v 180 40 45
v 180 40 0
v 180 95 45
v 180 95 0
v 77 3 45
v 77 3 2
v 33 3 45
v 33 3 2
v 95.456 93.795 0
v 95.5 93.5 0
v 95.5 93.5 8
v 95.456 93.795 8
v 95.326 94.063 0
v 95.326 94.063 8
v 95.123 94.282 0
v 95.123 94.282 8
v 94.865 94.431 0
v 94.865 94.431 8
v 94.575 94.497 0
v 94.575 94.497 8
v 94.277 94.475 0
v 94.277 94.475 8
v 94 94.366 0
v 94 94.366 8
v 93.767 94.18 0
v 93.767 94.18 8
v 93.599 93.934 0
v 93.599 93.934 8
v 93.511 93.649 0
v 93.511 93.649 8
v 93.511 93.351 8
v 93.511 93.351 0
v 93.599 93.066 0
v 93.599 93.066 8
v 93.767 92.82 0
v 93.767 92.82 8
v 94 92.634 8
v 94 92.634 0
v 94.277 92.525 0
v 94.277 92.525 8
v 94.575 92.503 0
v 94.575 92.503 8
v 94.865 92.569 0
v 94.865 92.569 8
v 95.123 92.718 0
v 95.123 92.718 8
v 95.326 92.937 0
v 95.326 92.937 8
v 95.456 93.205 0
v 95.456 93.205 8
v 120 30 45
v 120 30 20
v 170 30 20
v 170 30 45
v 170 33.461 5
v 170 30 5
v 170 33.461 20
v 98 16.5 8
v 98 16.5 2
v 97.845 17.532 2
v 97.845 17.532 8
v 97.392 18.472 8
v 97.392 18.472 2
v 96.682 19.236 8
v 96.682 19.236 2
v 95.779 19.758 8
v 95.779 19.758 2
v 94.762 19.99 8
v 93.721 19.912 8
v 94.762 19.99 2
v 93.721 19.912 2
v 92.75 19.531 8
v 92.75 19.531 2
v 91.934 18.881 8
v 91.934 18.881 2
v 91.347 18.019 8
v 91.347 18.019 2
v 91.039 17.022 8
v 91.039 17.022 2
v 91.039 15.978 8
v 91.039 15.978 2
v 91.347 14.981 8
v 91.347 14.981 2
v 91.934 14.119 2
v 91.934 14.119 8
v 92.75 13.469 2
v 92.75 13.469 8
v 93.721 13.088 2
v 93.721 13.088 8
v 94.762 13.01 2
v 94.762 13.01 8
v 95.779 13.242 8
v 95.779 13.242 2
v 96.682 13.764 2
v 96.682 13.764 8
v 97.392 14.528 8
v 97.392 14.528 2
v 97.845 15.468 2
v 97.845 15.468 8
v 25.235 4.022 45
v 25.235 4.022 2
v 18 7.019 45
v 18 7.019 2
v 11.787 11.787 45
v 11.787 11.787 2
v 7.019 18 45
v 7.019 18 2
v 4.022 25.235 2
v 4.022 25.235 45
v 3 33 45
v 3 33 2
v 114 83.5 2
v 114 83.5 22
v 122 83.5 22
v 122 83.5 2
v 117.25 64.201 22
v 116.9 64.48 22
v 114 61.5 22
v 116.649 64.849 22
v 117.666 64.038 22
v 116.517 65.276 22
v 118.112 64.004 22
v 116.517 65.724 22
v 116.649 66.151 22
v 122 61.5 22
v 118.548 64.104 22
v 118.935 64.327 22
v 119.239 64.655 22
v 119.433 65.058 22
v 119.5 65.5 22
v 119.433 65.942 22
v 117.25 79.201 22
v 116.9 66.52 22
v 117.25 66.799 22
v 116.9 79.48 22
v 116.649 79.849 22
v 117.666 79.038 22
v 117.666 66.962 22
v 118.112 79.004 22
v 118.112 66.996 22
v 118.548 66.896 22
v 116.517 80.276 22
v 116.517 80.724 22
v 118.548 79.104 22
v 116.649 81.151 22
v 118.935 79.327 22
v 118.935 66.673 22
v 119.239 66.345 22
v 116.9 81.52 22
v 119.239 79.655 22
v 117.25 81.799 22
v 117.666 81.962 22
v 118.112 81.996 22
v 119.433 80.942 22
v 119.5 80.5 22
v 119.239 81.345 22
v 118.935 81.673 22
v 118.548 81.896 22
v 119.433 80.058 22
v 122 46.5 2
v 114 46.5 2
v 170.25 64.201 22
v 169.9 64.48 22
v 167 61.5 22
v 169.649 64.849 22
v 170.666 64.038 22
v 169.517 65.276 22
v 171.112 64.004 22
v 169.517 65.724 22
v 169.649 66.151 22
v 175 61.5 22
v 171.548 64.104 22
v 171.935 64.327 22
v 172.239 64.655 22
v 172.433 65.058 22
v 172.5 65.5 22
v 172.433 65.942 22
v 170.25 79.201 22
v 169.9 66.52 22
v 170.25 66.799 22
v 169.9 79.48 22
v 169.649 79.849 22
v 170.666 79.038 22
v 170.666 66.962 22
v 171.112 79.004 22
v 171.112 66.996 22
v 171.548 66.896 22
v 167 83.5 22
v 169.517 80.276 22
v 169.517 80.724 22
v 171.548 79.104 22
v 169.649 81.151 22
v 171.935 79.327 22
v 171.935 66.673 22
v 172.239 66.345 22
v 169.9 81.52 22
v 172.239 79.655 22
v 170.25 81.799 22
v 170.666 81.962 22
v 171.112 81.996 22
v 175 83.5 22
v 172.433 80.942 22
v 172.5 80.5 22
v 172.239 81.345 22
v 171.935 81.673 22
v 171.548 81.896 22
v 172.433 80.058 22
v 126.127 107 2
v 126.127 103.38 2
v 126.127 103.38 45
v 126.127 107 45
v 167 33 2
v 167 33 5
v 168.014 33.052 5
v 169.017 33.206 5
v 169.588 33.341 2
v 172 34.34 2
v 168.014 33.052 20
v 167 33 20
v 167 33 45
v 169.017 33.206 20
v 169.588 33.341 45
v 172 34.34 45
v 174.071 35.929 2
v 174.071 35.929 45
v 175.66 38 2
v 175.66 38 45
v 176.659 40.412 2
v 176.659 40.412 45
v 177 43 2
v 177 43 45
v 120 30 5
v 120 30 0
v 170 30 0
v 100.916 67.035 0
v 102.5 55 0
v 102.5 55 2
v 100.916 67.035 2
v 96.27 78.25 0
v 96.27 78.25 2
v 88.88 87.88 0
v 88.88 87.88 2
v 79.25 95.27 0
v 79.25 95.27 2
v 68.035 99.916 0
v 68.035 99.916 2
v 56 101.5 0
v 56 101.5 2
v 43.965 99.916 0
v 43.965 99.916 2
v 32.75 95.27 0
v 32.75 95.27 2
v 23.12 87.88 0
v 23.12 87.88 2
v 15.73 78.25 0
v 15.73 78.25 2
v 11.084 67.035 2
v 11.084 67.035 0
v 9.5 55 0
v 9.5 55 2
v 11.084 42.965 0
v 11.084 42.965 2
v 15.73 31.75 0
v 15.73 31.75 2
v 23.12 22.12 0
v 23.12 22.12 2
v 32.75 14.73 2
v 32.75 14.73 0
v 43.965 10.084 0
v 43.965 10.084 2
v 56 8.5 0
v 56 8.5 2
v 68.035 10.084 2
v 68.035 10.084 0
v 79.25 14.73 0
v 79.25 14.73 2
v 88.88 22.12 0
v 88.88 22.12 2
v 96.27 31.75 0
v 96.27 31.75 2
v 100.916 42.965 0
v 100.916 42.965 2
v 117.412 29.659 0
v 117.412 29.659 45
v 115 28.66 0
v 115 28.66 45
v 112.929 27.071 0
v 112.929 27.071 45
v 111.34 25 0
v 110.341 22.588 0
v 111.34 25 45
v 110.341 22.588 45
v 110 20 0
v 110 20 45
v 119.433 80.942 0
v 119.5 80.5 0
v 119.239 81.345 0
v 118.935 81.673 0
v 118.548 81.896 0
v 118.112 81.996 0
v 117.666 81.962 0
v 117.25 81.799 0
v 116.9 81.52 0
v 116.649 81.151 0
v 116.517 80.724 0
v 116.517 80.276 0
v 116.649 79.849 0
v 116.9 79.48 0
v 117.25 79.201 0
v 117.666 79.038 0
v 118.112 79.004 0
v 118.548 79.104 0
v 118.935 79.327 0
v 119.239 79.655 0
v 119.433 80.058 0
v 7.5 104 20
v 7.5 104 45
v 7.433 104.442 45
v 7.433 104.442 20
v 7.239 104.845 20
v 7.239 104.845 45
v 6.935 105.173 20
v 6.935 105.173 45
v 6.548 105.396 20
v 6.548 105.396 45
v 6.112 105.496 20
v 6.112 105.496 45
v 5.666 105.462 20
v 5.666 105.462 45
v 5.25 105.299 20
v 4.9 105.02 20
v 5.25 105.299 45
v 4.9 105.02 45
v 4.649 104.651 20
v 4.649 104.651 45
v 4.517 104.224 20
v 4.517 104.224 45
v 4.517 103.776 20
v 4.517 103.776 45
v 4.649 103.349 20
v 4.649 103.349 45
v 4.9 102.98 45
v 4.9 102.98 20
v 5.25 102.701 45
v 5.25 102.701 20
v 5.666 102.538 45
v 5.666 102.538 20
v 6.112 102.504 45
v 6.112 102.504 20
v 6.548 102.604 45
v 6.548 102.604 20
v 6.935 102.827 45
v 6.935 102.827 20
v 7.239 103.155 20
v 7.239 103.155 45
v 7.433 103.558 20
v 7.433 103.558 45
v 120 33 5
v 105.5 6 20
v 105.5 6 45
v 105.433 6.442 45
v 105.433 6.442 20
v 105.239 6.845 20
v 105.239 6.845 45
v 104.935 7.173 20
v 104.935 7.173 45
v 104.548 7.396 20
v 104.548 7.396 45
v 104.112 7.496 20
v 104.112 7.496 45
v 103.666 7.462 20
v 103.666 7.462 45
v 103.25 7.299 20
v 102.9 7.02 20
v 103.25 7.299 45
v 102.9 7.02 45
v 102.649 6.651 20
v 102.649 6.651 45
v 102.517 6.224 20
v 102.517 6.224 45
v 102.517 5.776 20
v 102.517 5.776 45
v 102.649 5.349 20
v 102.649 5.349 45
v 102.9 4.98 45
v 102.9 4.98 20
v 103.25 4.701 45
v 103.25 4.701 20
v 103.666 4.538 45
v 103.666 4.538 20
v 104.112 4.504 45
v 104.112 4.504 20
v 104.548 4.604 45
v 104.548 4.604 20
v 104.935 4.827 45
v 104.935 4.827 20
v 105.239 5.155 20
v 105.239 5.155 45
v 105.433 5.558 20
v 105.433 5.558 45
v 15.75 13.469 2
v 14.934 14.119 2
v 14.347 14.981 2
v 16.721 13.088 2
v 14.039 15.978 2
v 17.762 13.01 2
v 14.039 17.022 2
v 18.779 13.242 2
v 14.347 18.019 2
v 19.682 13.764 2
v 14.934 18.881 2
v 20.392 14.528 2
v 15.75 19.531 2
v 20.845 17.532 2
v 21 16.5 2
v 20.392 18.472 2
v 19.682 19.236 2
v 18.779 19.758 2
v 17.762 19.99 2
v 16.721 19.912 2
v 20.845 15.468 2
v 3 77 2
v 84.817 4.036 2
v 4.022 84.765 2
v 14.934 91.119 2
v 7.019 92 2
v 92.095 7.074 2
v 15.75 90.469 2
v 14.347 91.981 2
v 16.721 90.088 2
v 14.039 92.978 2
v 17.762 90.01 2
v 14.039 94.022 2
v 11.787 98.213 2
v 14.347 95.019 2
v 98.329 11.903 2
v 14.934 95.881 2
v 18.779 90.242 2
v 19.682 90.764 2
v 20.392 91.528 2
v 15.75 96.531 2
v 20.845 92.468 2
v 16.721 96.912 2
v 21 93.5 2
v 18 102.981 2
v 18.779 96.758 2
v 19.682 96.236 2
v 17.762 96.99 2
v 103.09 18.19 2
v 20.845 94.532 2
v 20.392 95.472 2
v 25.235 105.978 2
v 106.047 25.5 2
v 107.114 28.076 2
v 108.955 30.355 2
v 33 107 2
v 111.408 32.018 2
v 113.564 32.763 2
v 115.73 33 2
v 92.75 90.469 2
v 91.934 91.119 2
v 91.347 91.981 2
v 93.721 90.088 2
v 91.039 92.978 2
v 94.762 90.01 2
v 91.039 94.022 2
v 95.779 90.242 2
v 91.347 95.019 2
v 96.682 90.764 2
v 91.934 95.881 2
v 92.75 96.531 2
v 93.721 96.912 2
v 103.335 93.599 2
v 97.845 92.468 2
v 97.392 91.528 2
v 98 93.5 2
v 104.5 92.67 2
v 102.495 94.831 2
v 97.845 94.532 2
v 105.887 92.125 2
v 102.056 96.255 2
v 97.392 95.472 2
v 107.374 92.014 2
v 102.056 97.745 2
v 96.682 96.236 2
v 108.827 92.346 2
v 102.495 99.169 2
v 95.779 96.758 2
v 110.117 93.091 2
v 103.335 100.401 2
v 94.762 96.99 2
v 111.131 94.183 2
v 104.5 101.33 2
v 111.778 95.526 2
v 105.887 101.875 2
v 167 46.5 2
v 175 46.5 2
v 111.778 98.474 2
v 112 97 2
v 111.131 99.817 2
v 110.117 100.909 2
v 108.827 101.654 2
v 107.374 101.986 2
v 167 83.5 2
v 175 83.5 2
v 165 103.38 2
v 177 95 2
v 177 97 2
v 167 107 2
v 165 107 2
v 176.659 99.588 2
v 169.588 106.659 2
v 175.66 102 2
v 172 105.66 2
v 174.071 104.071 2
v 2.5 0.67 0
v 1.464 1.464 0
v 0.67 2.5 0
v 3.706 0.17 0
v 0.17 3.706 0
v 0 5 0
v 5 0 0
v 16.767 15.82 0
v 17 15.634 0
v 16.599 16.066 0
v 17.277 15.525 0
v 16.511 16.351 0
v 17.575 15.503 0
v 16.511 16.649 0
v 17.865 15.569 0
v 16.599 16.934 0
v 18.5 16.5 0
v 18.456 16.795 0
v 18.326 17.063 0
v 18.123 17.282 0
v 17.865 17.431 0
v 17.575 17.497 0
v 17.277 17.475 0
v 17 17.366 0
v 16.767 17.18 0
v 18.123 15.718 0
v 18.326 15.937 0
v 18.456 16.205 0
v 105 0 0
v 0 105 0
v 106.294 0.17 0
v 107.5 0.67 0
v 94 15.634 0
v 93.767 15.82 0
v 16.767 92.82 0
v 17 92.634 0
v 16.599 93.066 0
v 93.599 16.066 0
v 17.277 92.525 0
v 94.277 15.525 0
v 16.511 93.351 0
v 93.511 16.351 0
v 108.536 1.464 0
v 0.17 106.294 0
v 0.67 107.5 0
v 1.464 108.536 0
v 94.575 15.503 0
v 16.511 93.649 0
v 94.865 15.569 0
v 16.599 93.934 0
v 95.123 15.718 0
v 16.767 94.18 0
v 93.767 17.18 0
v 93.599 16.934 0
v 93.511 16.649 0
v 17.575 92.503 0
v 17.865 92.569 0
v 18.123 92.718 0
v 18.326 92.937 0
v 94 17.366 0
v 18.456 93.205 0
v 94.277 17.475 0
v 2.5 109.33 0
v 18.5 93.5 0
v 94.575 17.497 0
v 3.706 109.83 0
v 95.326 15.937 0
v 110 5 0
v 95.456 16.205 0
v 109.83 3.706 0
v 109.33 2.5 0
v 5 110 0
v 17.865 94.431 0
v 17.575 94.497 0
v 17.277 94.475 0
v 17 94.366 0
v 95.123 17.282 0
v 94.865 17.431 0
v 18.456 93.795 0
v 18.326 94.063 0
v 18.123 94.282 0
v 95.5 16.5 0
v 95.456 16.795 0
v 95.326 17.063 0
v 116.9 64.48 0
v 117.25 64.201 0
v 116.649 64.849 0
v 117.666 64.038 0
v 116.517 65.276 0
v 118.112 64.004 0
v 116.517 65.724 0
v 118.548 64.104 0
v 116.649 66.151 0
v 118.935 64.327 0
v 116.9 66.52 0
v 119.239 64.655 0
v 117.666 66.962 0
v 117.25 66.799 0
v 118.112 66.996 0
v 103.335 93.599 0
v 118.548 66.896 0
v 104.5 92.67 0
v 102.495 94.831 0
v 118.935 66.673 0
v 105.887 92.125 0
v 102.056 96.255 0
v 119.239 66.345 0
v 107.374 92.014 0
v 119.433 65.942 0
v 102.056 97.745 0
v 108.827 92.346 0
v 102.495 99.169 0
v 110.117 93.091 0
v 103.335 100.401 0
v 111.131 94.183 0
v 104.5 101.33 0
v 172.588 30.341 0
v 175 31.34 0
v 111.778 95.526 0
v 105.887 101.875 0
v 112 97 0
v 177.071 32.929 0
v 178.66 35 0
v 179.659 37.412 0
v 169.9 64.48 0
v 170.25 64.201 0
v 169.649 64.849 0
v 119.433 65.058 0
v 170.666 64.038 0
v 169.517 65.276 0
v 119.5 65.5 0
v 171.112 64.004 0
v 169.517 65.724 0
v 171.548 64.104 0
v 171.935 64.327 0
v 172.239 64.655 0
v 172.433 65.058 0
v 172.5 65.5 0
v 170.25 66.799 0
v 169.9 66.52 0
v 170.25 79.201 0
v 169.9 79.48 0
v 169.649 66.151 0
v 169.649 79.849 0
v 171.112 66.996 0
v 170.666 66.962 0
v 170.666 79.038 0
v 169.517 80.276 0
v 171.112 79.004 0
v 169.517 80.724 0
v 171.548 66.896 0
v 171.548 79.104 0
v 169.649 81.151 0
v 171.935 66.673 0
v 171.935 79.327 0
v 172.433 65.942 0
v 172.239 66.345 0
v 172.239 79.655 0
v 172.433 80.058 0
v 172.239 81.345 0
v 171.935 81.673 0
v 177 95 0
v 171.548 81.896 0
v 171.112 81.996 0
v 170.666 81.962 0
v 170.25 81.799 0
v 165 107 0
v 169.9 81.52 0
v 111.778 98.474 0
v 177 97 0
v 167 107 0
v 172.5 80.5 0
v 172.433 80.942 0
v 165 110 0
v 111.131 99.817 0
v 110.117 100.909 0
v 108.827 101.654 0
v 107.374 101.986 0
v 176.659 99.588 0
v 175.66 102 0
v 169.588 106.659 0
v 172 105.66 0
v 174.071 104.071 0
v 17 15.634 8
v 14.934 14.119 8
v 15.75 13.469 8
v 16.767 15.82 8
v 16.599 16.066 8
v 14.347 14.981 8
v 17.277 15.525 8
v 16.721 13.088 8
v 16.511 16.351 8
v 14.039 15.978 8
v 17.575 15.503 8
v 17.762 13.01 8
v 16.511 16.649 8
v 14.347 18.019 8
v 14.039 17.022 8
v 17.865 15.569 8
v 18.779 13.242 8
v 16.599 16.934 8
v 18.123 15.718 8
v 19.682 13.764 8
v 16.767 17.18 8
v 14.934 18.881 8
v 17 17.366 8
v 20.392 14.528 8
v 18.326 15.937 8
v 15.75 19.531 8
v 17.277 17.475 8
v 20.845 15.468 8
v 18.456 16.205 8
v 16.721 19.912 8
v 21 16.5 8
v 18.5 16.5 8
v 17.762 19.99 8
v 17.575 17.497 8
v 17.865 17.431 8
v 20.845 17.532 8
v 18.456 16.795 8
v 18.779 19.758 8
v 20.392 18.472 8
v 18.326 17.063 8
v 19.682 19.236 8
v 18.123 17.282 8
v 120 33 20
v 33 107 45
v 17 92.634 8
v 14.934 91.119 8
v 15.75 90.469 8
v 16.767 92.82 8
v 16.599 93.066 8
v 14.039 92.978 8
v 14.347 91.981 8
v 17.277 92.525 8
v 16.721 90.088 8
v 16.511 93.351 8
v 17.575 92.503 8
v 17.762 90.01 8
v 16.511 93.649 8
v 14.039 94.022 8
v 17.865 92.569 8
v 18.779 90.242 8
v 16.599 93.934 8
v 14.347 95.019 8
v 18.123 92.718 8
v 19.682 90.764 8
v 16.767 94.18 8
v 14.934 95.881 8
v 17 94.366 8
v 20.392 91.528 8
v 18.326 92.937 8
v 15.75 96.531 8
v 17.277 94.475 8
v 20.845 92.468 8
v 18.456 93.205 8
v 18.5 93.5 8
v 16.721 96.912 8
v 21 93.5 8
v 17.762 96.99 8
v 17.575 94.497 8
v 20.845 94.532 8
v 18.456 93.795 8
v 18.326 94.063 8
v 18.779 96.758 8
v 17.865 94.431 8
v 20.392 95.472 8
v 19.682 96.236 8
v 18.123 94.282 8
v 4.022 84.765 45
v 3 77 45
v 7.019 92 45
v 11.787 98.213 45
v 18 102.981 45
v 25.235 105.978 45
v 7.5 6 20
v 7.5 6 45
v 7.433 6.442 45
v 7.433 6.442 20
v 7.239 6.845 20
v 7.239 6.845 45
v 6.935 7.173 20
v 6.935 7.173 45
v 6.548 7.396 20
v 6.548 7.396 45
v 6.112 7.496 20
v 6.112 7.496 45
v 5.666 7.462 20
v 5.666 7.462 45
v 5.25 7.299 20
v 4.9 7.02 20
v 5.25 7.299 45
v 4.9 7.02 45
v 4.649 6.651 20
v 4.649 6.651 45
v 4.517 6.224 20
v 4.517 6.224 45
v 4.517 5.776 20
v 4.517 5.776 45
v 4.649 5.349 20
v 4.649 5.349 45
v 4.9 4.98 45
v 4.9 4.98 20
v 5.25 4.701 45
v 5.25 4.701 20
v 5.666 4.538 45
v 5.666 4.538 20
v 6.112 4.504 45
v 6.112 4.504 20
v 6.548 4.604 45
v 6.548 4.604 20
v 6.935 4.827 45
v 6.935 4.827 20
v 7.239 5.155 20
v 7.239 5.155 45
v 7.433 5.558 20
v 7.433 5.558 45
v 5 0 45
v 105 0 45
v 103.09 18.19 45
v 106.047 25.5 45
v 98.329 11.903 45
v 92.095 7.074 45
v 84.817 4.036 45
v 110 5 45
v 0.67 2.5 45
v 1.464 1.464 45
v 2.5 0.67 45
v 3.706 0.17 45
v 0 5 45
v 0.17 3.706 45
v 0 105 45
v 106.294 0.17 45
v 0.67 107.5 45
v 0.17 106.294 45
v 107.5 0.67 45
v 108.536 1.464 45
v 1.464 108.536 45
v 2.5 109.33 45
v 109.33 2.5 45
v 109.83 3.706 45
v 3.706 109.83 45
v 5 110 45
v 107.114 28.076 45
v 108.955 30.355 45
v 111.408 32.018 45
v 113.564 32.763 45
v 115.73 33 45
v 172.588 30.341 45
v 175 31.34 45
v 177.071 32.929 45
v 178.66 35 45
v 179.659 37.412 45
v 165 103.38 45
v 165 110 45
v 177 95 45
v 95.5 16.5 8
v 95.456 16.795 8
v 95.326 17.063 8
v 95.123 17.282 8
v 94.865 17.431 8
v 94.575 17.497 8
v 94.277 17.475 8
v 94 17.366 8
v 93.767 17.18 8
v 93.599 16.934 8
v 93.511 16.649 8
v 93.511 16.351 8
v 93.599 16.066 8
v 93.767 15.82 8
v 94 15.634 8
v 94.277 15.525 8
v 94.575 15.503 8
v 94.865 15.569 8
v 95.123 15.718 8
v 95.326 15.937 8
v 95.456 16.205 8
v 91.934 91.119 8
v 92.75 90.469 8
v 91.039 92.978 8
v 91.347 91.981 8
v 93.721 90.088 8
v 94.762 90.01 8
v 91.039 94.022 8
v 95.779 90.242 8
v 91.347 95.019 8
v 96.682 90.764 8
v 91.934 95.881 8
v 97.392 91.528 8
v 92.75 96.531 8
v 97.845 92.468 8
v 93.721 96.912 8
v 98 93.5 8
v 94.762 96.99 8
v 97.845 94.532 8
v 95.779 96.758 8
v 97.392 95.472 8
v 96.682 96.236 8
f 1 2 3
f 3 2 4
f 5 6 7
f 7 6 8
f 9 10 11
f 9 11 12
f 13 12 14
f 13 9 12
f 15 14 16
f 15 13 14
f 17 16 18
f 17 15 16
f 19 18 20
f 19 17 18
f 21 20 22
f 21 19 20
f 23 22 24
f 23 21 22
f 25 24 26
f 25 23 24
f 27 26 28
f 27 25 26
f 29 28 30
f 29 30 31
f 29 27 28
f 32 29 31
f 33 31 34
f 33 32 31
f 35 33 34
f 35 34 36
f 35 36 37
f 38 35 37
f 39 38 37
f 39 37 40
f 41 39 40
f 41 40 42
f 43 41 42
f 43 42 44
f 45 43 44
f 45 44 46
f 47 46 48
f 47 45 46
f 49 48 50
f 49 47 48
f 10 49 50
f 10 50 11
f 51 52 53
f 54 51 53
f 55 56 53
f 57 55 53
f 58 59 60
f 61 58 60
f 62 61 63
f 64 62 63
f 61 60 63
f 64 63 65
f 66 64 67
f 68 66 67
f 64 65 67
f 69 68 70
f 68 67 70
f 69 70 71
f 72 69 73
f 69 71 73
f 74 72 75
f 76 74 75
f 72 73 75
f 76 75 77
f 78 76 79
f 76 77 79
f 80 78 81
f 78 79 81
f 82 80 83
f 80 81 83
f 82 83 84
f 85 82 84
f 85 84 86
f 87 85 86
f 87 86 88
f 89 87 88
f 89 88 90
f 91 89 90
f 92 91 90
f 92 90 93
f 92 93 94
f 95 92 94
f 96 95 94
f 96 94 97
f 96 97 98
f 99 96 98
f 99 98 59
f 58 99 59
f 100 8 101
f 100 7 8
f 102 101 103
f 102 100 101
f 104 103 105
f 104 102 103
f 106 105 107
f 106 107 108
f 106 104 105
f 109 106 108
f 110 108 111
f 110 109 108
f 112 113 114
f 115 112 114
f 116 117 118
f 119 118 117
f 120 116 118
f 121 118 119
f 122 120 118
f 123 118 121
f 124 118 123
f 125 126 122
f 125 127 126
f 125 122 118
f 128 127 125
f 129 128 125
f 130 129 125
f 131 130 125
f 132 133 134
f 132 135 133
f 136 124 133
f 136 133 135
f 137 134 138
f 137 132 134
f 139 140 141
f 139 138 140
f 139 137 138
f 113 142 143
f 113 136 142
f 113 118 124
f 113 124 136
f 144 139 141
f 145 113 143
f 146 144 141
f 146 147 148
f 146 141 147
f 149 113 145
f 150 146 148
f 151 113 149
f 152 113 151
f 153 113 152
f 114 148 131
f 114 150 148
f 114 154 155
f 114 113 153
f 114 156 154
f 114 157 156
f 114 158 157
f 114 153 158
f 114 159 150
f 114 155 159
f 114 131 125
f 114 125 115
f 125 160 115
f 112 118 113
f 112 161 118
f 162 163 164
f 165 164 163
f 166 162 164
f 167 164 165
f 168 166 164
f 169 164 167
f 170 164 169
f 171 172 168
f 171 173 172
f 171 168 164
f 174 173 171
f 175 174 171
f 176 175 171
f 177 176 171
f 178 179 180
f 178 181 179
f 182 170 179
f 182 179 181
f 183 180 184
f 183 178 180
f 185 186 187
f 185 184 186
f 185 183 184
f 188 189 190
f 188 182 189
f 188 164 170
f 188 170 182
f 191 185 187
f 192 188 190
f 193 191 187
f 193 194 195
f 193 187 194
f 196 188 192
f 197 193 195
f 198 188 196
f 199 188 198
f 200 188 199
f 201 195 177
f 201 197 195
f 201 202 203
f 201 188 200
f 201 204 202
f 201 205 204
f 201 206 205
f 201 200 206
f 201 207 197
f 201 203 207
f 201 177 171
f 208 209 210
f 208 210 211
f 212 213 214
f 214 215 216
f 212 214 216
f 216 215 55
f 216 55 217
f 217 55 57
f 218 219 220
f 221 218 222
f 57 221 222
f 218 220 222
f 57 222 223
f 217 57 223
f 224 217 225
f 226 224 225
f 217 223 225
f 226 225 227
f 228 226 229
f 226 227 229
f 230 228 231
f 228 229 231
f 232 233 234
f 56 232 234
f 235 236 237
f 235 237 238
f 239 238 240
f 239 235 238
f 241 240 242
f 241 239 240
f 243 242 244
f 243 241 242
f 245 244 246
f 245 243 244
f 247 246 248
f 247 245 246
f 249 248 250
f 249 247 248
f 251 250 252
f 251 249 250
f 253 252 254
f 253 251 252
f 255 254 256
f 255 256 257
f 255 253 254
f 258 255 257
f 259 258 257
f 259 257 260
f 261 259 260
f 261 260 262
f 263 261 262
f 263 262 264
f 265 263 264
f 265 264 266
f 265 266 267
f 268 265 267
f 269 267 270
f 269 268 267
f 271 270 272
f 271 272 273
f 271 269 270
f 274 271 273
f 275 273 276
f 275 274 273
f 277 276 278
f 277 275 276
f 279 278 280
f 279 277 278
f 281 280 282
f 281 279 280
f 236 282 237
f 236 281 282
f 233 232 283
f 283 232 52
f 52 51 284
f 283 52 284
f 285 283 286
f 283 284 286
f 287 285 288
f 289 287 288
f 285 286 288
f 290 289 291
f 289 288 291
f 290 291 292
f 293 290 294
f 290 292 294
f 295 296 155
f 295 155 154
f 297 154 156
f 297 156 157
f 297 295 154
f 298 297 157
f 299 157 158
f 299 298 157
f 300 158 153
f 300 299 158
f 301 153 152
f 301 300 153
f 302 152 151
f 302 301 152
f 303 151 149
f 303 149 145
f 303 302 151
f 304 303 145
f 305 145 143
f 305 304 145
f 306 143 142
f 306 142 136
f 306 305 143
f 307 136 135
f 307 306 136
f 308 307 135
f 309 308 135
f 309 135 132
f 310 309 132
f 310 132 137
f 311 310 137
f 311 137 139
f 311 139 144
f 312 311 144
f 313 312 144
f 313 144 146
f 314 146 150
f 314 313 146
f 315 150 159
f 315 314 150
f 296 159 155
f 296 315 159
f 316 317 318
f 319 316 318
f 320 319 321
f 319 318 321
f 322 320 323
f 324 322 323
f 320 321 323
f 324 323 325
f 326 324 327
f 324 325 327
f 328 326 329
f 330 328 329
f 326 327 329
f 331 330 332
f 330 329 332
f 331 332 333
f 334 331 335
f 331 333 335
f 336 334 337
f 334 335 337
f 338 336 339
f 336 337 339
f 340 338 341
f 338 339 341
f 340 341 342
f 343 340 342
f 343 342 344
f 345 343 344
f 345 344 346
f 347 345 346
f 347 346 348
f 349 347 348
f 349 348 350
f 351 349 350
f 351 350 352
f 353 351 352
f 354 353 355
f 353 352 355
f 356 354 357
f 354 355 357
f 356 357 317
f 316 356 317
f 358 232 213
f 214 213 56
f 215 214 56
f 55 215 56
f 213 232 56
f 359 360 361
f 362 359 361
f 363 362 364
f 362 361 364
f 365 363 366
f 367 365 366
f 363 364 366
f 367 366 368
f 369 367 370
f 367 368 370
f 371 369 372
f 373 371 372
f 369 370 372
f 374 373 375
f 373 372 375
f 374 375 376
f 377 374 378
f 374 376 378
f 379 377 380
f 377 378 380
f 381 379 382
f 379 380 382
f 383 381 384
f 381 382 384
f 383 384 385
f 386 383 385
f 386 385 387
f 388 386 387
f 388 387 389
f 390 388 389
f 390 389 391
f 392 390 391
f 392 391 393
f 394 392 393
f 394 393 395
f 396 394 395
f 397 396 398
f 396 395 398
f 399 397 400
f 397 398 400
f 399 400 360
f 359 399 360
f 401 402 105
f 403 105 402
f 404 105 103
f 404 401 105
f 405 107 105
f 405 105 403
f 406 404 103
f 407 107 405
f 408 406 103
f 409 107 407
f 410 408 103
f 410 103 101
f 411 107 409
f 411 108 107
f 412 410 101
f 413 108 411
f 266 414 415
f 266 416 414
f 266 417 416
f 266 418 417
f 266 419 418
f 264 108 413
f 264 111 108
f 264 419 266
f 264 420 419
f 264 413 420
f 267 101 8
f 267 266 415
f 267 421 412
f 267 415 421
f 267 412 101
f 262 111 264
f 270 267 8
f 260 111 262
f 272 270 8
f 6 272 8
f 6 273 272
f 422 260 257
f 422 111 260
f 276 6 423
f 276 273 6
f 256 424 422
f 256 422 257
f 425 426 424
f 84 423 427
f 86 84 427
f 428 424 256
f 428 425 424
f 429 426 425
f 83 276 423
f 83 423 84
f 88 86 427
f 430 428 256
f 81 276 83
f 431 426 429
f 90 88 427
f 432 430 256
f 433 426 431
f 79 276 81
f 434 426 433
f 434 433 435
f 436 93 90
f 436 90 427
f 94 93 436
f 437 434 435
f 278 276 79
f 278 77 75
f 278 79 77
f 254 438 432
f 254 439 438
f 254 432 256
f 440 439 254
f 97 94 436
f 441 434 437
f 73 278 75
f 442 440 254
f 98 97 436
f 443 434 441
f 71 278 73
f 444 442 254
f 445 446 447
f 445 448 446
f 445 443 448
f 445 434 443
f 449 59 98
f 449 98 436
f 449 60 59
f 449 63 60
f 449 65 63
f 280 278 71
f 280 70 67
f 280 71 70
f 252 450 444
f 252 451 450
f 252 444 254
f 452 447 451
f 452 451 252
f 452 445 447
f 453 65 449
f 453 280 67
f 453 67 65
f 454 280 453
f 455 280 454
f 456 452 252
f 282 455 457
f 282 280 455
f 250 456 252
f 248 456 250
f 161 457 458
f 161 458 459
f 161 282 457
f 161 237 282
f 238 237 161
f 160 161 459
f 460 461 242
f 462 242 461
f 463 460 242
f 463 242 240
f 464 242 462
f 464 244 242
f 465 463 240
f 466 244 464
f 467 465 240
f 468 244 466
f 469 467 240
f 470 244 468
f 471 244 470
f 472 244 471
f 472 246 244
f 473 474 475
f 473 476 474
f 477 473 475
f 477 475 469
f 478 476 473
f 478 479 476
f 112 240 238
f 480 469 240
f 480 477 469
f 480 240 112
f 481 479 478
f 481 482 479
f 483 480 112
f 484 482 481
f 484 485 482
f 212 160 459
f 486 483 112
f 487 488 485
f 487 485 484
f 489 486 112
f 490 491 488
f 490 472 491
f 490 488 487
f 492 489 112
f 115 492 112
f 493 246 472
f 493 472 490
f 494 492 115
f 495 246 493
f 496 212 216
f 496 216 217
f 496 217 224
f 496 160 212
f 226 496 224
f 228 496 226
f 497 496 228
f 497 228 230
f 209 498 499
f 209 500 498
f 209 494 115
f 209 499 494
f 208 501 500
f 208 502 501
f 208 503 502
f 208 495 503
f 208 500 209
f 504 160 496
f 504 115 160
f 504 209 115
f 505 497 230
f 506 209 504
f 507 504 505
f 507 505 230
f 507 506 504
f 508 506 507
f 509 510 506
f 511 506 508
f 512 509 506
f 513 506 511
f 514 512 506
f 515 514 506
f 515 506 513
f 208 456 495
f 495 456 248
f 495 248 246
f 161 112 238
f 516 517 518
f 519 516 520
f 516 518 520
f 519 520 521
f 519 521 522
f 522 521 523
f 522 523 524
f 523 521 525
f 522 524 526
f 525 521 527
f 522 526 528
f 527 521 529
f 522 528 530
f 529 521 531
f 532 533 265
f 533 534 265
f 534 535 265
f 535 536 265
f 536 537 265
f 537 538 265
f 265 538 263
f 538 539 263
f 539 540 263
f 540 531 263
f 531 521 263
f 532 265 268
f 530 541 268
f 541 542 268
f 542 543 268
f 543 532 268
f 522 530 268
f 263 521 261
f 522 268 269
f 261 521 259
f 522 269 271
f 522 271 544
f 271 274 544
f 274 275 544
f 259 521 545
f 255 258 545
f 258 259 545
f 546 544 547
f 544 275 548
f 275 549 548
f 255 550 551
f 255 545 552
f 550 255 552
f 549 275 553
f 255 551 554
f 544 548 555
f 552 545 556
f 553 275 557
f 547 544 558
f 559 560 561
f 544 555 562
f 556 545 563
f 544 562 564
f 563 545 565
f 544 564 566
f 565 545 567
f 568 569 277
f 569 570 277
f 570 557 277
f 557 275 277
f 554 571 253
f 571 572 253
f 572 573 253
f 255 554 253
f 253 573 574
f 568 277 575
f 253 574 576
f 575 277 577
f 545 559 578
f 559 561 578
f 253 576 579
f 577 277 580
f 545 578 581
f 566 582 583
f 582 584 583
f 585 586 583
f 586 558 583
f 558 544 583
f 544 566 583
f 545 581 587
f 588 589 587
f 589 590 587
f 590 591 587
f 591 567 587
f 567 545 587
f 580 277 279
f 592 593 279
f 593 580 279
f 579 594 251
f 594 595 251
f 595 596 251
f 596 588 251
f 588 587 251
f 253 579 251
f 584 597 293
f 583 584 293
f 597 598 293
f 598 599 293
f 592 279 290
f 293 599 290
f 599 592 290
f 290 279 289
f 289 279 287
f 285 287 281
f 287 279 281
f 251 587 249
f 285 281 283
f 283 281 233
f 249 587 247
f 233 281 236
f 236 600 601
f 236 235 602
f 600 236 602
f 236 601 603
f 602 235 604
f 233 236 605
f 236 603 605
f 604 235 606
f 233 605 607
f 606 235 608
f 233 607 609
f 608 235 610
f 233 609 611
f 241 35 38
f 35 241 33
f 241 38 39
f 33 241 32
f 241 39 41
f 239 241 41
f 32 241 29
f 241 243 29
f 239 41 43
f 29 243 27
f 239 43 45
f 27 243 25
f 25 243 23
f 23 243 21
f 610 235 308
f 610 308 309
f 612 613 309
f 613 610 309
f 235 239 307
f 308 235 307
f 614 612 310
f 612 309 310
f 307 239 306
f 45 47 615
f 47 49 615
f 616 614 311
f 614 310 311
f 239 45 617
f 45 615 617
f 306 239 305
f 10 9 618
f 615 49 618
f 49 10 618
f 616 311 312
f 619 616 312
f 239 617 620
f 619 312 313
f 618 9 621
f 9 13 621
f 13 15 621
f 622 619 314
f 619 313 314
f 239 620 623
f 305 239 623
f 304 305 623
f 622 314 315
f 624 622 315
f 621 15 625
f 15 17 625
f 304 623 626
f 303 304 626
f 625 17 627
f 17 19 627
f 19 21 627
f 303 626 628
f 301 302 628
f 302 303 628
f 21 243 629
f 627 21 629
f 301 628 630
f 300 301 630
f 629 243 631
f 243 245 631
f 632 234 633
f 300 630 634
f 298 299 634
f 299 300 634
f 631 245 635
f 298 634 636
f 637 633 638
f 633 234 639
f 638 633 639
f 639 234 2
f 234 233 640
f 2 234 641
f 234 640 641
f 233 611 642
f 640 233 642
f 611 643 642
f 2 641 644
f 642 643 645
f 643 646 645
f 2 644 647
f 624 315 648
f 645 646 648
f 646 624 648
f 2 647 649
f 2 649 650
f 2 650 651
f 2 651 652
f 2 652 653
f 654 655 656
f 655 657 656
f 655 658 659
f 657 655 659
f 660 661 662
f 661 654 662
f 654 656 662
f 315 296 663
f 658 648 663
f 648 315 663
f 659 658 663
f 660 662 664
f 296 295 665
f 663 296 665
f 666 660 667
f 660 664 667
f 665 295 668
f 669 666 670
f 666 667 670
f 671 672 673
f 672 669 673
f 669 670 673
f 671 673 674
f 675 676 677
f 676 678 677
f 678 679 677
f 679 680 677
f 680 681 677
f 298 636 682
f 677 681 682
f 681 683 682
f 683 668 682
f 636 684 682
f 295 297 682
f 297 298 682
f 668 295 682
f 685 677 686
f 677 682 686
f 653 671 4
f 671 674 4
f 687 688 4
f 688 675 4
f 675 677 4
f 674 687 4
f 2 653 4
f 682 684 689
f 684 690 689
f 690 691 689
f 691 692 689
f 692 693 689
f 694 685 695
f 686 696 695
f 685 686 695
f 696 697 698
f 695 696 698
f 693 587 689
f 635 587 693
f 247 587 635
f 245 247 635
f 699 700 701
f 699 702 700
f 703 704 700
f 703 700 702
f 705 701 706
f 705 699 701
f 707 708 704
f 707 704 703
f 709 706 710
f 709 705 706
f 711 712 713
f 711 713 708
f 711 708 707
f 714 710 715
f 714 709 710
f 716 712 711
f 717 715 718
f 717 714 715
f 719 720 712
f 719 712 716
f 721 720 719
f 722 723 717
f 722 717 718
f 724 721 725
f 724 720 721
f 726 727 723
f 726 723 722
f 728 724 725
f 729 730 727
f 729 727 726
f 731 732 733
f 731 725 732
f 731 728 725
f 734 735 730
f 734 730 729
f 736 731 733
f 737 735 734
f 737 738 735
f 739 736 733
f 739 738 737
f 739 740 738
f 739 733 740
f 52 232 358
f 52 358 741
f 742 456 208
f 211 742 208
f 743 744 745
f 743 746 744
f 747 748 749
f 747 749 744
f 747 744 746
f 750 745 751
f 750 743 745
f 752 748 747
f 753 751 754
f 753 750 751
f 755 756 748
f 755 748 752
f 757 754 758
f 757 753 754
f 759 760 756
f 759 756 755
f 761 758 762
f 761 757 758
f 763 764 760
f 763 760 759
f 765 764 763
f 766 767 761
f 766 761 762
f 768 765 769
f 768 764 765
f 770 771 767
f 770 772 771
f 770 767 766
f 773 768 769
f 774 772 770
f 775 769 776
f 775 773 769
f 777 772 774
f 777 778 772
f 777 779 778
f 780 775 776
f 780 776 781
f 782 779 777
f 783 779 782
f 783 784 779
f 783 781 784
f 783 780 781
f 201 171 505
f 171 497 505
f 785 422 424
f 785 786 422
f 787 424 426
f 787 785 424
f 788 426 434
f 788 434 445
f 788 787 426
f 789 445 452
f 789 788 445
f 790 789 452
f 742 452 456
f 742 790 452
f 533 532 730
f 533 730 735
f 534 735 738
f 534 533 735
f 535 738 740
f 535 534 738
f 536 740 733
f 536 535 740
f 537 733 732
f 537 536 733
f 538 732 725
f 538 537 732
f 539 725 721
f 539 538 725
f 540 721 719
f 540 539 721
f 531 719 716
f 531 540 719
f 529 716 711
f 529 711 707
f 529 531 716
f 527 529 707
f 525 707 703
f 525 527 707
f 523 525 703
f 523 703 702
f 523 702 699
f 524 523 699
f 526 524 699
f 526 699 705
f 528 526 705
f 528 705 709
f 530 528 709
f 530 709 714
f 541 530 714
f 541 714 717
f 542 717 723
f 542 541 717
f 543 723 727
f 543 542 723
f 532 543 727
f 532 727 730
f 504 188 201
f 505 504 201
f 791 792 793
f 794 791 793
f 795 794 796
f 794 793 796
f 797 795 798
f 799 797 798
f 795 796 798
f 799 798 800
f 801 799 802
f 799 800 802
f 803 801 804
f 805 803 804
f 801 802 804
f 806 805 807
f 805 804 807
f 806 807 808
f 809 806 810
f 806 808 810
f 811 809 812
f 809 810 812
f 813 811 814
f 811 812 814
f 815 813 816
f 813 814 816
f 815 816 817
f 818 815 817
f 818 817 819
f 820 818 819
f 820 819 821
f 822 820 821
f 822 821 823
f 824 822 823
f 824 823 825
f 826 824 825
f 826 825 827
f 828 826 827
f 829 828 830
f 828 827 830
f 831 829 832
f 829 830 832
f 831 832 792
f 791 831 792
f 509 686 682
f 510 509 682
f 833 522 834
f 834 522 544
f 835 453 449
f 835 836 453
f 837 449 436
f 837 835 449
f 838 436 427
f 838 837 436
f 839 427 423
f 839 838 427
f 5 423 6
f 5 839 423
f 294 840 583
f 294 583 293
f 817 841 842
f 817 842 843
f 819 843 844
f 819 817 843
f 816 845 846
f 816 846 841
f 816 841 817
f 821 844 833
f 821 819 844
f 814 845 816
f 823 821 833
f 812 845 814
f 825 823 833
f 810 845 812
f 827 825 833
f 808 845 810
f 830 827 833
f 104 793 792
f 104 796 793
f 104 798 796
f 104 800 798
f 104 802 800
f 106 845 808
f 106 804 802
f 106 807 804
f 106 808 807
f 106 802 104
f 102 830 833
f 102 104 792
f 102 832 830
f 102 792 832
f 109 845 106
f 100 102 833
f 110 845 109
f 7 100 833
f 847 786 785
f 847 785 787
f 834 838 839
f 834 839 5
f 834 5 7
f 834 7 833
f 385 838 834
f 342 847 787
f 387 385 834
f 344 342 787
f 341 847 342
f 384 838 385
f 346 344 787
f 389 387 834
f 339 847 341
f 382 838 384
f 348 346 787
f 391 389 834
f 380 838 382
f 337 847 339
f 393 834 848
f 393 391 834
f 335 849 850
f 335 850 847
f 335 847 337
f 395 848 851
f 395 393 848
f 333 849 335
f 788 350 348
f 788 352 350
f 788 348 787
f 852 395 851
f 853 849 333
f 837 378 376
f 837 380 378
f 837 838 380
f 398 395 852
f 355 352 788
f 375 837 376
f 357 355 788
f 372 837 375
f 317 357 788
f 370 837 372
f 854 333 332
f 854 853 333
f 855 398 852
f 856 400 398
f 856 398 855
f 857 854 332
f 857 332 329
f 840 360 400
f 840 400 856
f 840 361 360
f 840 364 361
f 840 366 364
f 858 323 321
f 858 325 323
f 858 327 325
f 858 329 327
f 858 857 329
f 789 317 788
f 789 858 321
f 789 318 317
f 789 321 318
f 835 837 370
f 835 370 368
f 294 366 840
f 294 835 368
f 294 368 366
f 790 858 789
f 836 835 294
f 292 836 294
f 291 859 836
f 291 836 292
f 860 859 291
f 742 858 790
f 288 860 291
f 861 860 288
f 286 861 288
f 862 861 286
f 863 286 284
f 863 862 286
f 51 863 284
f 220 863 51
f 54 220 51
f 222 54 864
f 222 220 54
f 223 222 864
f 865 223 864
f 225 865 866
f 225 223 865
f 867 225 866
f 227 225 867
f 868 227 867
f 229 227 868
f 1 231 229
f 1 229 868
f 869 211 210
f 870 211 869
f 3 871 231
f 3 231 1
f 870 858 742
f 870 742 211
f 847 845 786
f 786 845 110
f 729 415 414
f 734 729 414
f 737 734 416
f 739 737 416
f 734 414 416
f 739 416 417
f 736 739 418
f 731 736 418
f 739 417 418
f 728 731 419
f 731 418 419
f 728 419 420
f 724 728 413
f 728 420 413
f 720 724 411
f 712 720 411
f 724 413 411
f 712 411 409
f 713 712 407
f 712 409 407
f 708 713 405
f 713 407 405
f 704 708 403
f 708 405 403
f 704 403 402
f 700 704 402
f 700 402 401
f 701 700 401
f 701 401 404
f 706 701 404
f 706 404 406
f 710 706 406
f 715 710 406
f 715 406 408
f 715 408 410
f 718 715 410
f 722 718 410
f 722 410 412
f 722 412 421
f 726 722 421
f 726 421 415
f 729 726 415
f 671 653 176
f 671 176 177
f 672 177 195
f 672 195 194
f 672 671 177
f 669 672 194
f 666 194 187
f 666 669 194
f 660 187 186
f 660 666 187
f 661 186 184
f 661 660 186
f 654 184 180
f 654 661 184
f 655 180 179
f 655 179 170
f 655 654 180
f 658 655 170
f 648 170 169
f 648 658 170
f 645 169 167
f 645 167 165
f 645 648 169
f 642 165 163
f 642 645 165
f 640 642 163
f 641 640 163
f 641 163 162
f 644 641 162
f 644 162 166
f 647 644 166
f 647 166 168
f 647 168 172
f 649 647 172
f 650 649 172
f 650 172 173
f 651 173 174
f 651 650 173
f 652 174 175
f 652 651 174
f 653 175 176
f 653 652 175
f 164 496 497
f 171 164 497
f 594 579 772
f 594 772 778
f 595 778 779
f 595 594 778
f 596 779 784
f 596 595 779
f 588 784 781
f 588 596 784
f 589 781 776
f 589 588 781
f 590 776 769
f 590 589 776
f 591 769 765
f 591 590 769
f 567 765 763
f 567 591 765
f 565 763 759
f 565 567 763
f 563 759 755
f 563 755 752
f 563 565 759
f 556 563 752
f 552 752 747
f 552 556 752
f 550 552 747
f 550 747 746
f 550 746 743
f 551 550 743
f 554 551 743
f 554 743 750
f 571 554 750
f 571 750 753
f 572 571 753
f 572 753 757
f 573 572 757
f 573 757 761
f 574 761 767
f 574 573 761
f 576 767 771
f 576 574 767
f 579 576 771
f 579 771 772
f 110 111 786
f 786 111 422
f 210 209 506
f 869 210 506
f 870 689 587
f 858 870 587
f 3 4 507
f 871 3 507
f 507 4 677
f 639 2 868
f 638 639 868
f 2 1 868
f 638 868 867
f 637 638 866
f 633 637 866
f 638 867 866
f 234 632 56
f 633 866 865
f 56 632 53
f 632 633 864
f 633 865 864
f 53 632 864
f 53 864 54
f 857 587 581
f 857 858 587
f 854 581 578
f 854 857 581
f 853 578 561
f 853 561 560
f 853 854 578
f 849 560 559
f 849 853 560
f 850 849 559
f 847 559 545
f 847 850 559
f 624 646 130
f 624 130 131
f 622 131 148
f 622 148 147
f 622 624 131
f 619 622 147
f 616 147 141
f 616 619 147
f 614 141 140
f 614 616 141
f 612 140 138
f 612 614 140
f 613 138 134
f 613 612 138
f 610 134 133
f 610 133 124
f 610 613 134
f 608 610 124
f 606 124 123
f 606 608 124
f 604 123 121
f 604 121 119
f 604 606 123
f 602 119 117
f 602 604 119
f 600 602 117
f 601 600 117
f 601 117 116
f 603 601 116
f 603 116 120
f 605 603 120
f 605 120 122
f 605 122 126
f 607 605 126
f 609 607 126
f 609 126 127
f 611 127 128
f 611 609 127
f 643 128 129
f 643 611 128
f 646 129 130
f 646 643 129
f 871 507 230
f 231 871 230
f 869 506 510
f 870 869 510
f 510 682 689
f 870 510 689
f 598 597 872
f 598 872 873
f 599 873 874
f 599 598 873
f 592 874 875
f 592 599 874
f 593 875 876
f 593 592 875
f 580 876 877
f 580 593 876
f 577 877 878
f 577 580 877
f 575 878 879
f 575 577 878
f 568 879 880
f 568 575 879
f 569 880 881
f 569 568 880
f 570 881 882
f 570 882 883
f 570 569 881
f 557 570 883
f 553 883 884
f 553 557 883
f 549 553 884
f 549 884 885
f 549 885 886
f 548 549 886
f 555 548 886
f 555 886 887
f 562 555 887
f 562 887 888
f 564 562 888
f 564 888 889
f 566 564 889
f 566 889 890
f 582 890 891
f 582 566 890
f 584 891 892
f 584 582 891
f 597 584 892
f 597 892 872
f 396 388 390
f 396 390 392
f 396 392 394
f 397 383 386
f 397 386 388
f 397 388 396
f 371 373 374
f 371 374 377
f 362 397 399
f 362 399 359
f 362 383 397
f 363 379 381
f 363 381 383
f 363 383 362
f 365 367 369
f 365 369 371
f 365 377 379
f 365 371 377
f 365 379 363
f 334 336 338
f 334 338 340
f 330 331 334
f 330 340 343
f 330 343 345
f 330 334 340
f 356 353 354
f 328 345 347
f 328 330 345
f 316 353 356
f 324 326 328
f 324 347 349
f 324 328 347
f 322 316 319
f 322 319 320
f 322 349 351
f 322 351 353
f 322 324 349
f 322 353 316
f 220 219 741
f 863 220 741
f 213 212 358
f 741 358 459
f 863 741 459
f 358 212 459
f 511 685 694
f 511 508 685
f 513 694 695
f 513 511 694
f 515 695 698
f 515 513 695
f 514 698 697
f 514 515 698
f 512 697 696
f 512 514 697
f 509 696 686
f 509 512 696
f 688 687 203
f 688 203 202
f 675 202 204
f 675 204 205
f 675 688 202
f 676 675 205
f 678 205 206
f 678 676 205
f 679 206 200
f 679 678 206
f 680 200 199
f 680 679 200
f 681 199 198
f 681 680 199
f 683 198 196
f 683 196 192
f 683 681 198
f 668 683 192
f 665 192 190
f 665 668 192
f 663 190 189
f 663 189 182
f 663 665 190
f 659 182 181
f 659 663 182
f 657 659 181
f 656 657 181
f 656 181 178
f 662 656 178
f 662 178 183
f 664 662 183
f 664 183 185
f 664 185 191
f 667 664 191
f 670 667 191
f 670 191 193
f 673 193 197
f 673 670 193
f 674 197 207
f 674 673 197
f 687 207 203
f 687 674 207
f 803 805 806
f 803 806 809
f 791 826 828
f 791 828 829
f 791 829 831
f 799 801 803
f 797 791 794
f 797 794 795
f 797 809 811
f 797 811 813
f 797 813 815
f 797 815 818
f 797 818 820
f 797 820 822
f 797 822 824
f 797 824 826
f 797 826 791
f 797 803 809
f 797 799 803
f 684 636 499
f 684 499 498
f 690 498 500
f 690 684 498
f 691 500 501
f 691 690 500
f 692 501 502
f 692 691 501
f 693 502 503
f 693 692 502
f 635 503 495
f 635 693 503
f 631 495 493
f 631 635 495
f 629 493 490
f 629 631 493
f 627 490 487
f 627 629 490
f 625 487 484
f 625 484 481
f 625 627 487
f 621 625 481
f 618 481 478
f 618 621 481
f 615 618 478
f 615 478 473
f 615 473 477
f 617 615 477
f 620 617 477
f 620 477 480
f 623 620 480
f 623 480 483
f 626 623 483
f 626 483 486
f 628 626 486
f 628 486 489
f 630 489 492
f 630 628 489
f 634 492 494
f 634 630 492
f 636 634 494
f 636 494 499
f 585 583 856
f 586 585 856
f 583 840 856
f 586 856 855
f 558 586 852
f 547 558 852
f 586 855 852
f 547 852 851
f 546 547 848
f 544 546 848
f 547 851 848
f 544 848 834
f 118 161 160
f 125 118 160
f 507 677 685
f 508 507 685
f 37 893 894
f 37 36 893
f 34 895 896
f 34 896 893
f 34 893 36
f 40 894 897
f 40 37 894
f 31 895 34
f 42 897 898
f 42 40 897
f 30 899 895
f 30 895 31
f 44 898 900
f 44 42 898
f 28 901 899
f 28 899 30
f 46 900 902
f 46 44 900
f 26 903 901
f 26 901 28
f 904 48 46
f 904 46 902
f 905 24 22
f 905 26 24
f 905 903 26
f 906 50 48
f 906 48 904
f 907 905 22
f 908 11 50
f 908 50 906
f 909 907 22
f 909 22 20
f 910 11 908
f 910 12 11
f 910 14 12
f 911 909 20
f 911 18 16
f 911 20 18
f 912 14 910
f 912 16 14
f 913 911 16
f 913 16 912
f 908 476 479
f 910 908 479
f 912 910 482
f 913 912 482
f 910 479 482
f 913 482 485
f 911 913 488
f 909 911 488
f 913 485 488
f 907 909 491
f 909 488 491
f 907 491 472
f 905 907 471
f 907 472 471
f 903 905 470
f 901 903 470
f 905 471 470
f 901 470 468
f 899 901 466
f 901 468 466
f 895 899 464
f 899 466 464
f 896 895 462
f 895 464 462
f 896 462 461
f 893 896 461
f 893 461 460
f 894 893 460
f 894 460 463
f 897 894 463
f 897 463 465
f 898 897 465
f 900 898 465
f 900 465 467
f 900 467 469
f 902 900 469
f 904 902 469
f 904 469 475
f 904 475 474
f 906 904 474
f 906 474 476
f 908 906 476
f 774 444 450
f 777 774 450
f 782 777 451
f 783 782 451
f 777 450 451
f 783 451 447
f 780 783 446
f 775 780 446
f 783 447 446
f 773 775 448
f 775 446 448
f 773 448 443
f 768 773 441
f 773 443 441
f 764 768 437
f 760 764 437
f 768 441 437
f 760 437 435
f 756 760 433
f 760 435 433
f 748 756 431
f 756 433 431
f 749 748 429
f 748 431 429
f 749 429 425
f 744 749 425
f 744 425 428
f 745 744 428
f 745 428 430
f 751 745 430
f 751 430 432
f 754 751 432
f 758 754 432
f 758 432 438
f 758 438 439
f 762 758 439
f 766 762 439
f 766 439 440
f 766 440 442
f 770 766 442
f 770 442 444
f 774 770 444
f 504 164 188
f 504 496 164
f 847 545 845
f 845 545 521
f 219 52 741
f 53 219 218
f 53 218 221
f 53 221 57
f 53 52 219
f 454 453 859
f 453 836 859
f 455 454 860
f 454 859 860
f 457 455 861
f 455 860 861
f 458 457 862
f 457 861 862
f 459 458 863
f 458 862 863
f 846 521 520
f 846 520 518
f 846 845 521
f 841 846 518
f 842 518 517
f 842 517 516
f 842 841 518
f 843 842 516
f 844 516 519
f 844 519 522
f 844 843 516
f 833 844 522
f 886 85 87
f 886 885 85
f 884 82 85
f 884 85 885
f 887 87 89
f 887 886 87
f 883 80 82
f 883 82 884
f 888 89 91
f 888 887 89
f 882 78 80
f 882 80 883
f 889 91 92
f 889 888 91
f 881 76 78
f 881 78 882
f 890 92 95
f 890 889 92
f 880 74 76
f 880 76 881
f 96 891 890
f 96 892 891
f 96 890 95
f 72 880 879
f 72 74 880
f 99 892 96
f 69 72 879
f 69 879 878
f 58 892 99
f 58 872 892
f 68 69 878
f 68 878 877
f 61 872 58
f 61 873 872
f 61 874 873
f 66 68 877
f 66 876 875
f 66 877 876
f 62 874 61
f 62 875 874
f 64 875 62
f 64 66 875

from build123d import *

# Parameters (mm, degrees)
F0_R        = 3.5
F0_R_2      = 46.5
F0_W        = 8
F0_H        = 37
F0_R_3      = 5
F1_DEPTH    = 2
F0_R_4      = 1.5
F2_DEPTH    = 22
F0_W_2      = 38.8732933998
F0_H_2      = 3.6201002002
F0_W_3      = 3
F0_H_3      = 27
F3_DEPTH    = 45
F4_R        = 29.99999
F5_R        = 10
F6_W        = 50
F6_H        = 15
F7_DEPTH    = 5
F8_R        = 5
F0_R_5      = 1
F9_DEPTH    = 8
F10_R       = 1.5
F11_DEPTH   = 25
F12_SIZE2   = 19.99999
F12_SIZE    = 14.99999
F12_2_SIZE2 = 19.99999
F12_2_SIZE  = 14.99999


# Not quite as in the source:
# - a fillet or chamfer is up to 0.001 mm smaller than in the source, because OpenCascade refuses the exact size


with BuildPart() as f1:
    # F0 (on Top) → F1 (new body)
    with BuildSketch(Plane.XY):
        Polygon((126.1267066002, 107), (3, 107), (3, 3), (107, 3), (107, 30), (107, 33), (177, 33), (177, 95), (177, 107), (165, 107), (165, 103.3798997998), (126.1267066002, 103.3798997998), align=None)
        with Locations((17.5, 16.5)):
            Circle(F0_R, mode=Mode.SUBTRACT)
        with Locations((94.5, 16.5)):
            Circle(F0_R, mode=Mode.SUBTRACT)
        with Locations((56, 55)):
            Circle(F0_R_2, mode=Mode.SUBTRACT)
        with Locations((17.5, 93.5)):
            Circle(F0_R, mode=Mode.SUBTRACT)
        with Locations((118, 65)):
            Rectangle(F0_W, F0_H, mode=Mode.SUBTRACT)
        with Locations((171, 65)):
            Rectangle(F0_W, F0_H, mode=Mode.SUBTRACT)
        with Locations((94.5, 93.5)):
            Circle(F0_R, mode=Mode.SUBTRACT)
        with Locations((107, 97)):
            Circle(F0_R_3, mode=Mode.SUBTRACT)
    extrude(amount=F1_DEPTH)

    # F0 (on Top) → F2 (join)
    with BuildSketch(Plane.XY):
        with Locations((118, 65)):
            Rectangle(F0_W, F0_H)
        with Locations((118, 65.5)):
            Circle(F0_R_4, mode=Mode.SUBTRACT)
        with Locations((118, 80.5)):
            Circle(F0_R_4, mode=Mode.SUBTRACT)
        with Locations((171, 65)):
            Rectangle(F0_W, F0_H)
        with Locations((171, 65.5)):
            Circle(F0_R_4, mode=Mode.SUBTRACT)
        with Locations((171, 80.5)):
            Circle(F0_R_4, mode=Mode.SUBTRACT)
    extrude(amount=F2_DEPTH)

    # F0 (on Top) → F3 (join)
    with BuildSketch(Plane.XY):
        Polygon((3, 110), (0, 110), (0, 3), (3, 3), (3, 107), align=None)
        Polygon((165, 110), (3, 110), (3, 107), (126.1267066002, 107), (165, 107), align=None)
        Polygon((3, 3), (0, 3), (0, 0), (110, 0), (110, 3), (107, 3), align=None)
        with Locations((145.5633533001, 105.1899498999)):
            Rectangle(F0_W_2, F0_H_2)
        with Locations((108.5, 16.5)):
            Rectangle(F0_W_3, F0_H_3)
        Polygon((107, 33), (107, 30), (110, 30), (177, 30), (177, 33), align=None)
        Polygon((180, 30), (180, 95), (177, 95), (177, 33), (177, 30), align=None)
    extrude(amount=F3_DEPTH)

    # F4 (radius 30 in the source; OpenCascade refuses exactly that, so slightly less here)
    f4_edges = [f1.edges().sort_by_distance(p)[0] for p in [
        (3, 107, 23.5),
        (3, 3, 23.5),
        (107, 3, 23.5),
    ]]
    fillet(f4_edges, radius=F4_R)

    # F5
    f5_edges = [f1.edges().sort_by_distance(p)[0] for p in [
        (177, 33, 23.5),
        (180, 30, 22.5),
        (110, 30, 22.5),
        (107, 33, 23.5),
        (177, 107, 1),
    ]]
    fillet(f5_edges, radius=F5_R)

    # F6 (on face) → F7 (cut)
    with BuildSketch(Plane.XZ.offset(-30)):
        with Locations((145, 12.5)):
            Rectangle(F6_W, F6_H)
    extrude(amount=-F7_DEPTH, mode=Mode.SUBTRACT)

    # F8
    f8_edges = [f1.edges().sort_by_distance(p)[0] for p in [
        (110, 0, 22.5),
        (0, 0, 22.5),
        (0, 110, 22.5),
    ]]
    fillet(f8_edges, radius=F8_R)

    # F0 (on Top) → F9 (join)
    with BuildSketch(Plane.XY):
        with Locations((94.5, 93.5)):
            Circle(F0_R)
        with Locations((94.5, 93.5)):
            Circle(F0_R_5, mode=Mode.SUBTRACT)
        with Locations((17.5, 93.5)):
            Circle(F0_R)
        with Locations((17.5, 93.5)):
            Circle(F0_R_5, mode=Mode.SUBTRACT)
        with Locations((17.5, 16.5)):
            Circle(F0_R)
        with Locations((17.5, 16.5)):
            Circle(F0_R_5, mode=Mode.SUBTRACT)
        with Locations((94.5, 16.5)):
            Circle(F0_R)
        with Locations((94.5, 16.5)):
            Circle(F0_R_5, mode=Mode.SUBTRACT)
    extrude(amount=F9_DEPTH)

    # F10 (on face) → F11 (cut)
    with BuildSketch(Plane.XY.offset(45)):
        with Locations((6, 104)):
            Circle(F10_R)
        with Locations((6, 6)):
            Circle(F10_R)
        with Locations((104, 6)):
            Circle(F10_R)
    extrude(amount=-F11_DEPTH, mode=Mode.SUBTRACT)

    # F12 (size 15 and 20 in the source; OpenCascade refuses exactly that, so slightly less here)
    f12_edges = [f1.edges().sort_by_distance(p)[0] for p in [
        (118, 46.5, 22),
    ]]
    f12_side = f1.faces().sort_by_distance((118, 83.12145, 22))[0]
    chamfer(f12_edges, length=F12_SIZE, length2=F12_SIZE2, reference=f12_side)

    # F12#2 (size 15 and 20 in the source; OpenCascade refuses exactly that, so slightly less here)
    f12_2_edges = [f1.edges().sort_by_distance(p)[0] for p in [
        (171, 46.5, 22),
    ]]
    f12_2_side = f1.faces().sort_by_distance((171, 83.12145, 22))[0]
    chamfer(f12_2_edges, length=F12_2_SIZE, length2=F12_2_SIZE2, reference=f12_2_side)


solid = f1.part
